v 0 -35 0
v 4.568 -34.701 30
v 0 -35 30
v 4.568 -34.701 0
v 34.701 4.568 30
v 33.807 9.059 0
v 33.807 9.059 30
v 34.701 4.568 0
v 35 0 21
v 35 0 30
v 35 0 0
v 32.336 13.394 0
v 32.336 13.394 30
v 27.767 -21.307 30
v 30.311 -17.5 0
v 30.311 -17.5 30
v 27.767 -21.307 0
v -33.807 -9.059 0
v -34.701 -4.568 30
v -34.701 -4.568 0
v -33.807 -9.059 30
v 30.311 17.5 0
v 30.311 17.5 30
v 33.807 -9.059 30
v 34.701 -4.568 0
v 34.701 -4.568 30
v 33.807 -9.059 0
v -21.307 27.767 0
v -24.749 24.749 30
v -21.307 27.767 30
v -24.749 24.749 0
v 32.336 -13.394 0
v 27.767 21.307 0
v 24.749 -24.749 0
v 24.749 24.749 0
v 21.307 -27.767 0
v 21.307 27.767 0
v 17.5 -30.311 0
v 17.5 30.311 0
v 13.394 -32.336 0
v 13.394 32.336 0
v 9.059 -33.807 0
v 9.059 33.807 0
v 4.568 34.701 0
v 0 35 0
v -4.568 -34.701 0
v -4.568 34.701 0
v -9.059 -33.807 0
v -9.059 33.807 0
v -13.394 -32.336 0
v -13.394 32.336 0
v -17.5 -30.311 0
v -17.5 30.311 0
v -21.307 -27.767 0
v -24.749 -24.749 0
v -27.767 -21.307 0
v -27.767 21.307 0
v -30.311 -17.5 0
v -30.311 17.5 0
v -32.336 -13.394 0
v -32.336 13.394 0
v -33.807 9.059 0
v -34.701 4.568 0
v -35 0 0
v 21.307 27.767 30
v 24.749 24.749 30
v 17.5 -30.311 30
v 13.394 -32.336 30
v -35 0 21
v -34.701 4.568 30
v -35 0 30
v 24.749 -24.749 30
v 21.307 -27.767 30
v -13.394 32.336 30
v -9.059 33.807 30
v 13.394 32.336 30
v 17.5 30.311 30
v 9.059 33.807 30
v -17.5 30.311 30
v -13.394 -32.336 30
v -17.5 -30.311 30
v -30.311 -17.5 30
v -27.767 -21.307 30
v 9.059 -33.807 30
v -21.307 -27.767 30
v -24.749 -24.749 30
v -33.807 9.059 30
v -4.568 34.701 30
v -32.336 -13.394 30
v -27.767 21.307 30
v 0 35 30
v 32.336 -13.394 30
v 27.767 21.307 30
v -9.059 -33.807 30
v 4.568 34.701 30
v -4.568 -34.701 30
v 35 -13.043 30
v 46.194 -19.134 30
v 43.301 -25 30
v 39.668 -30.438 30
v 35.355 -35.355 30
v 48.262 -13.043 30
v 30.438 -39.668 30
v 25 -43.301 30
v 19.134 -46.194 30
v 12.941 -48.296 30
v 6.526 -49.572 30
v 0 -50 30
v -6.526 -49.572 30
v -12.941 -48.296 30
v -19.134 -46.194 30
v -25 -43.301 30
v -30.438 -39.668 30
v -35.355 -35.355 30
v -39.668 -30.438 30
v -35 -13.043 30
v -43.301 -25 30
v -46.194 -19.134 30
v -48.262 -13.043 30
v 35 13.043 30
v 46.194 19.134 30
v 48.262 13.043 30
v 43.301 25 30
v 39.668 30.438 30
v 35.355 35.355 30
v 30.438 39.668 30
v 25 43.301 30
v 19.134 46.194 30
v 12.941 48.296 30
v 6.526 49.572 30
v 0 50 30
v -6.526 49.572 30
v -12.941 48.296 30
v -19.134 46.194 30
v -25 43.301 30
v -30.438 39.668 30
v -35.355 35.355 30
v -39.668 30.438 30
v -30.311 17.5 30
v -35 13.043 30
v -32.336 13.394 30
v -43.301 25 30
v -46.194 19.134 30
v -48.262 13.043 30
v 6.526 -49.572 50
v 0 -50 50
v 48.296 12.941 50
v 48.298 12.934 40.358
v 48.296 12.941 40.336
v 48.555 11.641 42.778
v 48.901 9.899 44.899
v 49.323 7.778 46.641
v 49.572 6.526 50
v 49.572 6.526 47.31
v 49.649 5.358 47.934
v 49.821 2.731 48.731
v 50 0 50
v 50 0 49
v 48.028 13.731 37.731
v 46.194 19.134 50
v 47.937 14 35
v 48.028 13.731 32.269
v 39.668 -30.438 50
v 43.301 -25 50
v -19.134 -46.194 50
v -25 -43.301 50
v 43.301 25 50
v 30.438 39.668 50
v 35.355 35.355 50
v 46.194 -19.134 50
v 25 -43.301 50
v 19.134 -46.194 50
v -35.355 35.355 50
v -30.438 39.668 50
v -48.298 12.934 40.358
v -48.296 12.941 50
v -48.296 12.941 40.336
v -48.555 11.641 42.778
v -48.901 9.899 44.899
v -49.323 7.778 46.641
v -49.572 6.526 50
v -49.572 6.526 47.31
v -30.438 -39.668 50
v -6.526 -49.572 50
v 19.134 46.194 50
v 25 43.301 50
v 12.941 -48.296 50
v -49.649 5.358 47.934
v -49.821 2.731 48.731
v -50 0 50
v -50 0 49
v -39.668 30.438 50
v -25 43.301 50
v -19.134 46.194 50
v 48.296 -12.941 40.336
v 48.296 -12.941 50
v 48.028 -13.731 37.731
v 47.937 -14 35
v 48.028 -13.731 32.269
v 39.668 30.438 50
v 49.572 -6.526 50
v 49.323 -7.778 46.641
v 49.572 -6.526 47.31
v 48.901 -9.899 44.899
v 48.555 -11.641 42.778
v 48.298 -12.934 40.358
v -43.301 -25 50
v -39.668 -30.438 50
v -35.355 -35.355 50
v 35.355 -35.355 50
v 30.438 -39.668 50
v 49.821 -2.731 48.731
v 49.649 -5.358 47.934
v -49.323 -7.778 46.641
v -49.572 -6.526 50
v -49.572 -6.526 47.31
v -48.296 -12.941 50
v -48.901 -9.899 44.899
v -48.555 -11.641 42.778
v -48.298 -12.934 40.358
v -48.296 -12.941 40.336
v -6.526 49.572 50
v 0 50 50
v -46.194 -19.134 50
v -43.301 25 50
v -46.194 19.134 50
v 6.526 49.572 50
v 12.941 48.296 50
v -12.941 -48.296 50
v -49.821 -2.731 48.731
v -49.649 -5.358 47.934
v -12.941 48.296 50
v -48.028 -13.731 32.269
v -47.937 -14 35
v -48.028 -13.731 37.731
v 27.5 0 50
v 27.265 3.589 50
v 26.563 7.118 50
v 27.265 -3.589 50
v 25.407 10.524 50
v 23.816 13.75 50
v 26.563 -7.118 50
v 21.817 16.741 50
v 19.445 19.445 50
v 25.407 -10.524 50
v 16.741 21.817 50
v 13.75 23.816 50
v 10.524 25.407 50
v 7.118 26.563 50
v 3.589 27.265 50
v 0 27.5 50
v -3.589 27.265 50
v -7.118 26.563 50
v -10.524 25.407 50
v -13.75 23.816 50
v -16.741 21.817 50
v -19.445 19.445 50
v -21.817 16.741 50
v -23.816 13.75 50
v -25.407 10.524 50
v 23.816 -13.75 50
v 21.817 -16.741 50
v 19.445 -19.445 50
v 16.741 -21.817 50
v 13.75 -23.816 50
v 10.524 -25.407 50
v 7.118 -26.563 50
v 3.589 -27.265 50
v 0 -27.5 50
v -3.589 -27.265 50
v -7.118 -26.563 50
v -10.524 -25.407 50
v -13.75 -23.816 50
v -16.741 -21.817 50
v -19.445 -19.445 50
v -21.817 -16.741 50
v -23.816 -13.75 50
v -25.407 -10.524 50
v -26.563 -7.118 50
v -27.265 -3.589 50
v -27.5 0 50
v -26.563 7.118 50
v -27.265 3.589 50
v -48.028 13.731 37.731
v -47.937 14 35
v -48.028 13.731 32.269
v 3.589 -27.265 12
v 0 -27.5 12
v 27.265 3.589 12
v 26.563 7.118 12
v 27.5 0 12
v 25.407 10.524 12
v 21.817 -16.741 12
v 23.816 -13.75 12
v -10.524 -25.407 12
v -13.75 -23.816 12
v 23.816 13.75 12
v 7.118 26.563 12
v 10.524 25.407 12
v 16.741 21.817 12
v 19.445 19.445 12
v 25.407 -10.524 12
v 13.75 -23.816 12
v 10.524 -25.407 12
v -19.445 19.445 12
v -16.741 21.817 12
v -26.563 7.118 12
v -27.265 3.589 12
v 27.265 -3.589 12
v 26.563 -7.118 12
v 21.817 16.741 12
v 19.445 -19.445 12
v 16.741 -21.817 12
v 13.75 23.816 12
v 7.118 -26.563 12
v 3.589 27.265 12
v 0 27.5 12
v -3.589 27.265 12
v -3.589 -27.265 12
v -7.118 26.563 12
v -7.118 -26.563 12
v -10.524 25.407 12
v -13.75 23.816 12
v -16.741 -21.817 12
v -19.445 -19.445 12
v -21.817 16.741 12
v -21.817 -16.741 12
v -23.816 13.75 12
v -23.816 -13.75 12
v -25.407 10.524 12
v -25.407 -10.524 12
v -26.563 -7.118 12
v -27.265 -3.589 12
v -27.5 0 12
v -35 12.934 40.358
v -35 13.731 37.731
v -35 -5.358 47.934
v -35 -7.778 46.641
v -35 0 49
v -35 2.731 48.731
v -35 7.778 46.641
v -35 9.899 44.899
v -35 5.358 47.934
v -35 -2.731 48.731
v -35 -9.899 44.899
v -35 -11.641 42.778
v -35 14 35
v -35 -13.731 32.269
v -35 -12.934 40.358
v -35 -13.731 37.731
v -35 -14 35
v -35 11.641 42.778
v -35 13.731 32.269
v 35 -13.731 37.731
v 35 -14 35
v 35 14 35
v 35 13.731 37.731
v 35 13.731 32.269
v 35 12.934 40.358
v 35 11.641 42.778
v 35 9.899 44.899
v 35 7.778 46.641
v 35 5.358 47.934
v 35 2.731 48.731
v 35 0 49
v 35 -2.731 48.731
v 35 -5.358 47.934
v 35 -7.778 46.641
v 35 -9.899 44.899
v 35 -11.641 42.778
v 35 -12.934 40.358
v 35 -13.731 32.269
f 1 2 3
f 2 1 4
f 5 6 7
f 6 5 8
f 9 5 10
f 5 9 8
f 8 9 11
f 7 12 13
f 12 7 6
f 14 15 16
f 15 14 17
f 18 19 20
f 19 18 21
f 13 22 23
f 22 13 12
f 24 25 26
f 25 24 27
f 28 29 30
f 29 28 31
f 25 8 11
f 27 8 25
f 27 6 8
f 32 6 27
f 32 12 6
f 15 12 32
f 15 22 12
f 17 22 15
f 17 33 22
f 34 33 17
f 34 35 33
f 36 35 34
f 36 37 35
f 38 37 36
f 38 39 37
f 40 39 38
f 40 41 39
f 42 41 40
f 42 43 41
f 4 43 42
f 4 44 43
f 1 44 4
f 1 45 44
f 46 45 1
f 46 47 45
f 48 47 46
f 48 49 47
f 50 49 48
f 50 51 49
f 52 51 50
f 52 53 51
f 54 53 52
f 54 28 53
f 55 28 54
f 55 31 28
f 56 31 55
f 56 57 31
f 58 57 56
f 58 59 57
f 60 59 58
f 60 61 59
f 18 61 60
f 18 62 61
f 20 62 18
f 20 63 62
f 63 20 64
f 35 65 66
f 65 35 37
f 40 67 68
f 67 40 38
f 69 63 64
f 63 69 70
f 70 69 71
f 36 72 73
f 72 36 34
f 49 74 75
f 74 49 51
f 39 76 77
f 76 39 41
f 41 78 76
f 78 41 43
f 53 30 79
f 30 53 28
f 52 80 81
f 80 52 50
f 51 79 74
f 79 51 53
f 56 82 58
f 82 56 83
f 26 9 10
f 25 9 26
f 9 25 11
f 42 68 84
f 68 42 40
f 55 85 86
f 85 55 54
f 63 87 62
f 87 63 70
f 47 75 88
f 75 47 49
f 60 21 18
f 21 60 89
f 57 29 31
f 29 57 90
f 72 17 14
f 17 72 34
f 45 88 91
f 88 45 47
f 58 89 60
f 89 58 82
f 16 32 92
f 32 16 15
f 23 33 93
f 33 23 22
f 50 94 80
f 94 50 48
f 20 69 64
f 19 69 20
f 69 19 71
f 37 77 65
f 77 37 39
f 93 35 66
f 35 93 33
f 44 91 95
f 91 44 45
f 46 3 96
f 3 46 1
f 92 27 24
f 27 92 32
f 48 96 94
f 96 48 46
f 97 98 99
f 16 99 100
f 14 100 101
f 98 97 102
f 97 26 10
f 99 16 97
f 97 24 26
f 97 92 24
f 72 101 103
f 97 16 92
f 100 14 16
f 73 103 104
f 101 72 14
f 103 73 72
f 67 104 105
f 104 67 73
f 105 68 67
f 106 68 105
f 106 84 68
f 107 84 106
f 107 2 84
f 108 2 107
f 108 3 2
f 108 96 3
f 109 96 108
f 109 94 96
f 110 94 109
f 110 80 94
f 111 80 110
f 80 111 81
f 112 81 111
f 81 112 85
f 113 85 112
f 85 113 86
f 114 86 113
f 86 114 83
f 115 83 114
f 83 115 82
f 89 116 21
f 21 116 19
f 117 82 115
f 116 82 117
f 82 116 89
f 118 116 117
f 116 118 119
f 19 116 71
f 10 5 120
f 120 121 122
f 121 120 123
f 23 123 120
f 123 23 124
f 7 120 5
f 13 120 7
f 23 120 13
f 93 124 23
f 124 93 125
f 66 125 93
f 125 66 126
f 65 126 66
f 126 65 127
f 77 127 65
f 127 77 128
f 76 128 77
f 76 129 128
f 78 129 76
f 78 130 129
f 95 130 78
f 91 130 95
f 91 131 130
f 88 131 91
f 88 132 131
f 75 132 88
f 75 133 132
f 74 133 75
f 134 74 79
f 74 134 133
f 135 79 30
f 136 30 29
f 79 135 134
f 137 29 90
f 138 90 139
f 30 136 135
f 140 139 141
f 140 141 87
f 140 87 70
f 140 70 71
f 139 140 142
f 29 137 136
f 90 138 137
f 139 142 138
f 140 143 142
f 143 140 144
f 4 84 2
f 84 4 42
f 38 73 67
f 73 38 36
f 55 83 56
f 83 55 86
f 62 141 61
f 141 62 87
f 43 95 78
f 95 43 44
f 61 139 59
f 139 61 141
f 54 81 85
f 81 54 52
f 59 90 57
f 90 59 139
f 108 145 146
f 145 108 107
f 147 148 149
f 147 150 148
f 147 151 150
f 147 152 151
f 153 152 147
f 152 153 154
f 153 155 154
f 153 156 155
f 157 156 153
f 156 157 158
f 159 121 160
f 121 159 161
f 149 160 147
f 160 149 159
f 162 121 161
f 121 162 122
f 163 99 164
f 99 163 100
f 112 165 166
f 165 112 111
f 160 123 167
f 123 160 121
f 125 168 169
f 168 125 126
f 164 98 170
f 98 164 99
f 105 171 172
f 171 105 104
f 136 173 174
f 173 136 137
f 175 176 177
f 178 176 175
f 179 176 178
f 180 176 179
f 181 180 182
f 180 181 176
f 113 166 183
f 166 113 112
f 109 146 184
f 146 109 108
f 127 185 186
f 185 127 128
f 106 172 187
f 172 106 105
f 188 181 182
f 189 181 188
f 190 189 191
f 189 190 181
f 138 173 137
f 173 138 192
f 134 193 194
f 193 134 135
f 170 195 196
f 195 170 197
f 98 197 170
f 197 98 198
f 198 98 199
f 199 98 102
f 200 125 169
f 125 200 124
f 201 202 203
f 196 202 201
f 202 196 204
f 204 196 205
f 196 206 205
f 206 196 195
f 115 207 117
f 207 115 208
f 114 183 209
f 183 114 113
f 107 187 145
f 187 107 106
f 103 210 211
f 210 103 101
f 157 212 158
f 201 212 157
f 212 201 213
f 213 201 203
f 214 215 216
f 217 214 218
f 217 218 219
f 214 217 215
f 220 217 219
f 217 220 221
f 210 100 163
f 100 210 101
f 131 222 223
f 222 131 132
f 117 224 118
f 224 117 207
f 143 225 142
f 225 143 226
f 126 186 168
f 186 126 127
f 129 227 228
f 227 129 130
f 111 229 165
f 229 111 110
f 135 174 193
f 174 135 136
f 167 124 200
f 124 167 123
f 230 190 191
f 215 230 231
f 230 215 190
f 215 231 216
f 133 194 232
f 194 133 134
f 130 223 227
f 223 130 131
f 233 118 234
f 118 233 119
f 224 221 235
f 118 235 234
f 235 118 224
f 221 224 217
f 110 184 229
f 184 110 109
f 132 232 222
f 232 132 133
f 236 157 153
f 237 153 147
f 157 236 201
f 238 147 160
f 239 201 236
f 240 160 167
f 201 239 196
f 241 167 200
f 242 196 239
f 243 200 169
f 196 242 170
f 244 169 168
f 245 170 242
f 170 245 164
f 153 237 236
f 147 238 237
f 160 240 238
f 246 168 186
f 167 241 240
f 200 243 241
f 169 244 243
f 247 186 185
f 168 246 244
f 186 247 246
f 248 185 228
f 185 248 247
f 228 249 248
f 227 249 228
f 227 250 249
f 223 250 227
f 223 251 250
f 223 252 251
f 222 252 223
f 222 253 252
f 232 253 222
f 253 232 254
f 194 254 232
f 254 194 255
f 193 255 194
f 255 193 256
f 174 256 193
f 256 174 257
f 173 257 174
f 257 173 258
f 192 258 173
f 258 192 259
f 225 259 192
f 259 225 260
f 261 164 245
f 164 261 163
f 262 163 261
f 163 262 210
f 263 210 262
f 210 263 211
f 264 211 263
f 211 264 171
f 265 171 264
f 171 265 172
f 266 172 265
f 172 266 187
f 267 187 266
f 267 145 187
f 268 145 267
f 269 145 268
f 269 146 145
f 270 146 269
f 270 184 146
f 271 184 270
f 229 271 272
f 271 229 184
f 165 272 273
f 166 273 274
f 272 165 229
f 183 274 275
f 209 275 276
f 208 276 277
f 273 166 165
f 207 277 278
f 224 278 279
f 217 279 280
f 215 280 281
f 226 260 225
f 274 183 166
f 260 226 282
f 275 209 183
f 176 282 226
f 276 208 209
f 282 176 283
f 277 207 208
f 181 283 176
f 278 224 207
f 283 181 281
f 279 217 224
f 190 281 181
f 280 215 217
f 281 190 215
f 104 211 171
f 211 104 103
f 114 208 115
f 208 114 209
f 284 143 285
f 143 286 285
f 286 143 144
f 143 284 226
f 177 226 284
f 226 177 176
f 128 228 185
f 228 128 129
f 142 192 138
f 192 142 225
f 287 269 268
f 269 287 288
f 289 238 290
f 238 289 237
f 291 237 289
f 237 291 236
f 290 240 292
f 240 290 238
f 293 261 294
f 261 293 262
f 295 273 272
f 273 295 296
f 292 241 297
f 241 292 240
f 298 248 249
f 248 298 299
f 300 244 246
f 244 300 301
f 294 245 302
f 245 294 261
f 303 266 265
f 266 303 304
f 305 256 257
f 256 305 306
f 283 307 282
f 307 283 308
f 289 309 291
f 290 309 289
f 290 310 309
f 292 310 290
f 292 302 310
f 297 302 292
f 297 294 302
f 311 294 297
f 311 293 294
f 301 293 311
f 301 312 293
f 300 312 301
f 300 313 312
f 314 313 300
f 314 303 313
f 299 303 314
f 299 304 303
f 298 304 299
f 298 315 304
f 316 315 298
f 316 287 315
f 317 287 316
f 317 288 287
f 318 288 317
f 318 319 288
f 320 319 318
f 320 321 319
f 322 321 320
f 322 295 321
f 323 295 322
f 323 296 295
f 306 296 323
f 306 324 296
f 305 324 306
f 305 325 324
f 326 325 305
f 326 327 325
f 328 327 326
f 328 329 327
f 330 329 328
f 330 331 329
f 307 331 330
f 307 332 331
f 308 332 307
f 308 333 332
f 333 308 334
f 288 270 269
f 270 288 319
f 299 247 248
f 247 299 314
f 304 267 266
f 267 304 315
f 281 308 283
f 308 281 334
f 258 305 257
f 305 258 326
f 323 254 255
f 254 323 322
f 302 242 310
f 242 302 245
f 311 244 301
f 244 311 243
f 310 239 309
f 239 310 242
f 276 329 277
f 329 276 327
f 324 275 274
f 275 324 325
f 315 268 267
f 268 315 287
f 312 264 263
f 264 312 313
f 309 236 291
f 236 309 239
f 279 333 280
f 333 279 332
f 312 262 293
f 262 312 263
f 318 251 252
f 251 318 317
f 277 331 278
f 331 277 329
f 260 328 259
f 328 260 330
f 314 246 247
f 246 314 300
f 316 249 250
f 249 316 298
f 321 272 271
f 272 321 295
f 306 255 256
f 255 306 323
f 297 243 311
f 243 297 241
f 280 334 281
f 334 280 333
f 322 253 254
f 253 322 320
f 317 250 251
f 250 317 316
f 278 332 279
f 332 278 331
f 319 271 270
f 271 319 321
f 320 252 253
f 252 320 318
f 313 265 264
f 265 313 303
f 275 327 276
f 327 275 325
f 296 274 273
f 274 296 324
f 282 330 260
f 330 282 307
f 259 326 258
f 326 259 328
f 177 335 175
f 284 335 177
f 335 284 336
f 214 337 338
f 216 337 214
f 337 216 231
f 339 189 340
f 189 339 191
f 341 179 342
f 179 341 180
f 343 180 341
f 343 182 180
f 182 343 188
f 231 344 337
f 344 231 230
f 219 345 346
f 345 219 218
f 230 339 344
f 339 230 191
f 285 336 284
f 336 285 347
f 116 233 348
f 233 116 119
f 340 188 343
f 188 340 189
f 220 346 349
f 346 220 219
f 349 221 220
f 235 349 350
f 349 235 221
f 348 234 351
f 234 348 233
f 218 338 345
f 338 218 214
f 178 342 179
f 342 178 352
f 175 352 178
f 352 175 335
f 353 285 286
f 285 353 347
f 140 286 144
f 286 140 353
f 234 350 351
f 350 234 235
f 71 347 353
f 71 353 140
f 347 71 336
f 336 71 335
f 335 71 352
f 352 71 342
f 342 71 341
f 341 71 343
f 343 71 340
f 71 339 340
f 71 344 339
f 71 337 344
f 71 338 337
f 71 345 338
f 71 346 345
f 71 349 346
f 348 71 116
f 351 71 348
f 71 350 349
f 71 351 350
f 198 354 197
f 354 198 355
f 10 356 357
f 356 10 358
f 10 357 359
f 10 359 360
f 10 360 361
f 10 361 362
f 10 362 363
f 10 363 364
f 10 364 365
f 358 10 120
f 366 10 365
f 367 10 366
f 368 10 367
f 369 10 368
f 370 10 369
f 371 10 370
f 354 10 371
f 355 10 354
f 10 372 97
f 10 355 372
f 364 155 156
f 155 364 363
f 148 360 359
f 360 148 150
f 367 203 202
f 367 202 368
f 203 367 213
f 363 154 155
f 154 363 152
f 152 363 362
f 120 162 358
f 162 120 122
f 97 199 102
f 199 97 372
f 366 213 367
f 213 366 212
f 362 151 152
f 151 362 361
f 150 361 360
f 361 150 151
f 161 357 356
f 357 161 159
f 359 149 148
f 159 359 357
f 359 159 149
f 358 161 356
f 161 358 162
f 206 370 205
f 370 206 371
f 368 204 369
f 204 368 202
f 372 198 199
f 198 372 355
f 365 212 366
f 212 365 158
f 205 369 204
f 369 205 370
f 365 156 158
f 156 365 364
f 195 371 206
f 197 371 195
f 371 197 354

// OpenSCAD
module brine_tank_adapter() {
  difference() {
    union() {
      cylinder(h=30, d=70, $fn=48);
      translate([0, 0, 30]) cylinder(h=20, d=100, $fn=48);
    }
    translate([0, 0, 12]) cylinder(h=50, d=55, $fn=48);
    translate([-35, 0, 35]) rotate([0,-90,0]) cylinder(h=50, d=28, $fn=32);
    translate([35, 0, 35]) rotate([0,90,0]) cylinder(h=50, d=28, $fn=32);
  }
}
brine_tank_adapter();
